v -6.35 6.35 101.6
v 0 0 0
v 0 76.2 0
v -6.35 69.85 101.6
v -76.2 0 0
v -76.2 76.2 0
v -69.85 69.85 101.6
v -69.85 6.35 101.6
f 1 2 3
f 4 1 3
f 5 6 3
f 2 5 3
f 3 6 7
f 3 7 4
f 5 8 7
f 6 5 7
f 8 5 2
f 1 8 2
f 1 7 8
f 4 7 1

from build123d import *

# Parameters (mm, degrees)
F0_W     = 76.2
F0_H     = 76.2
F1_DEPTH = 101.6
F2_SIZE2 = 101.59999
F2_SIZE  = 6.34999


# Not quite as in the source:
# - a fillet or chamfer is up to 0.001 mm smaller than in the source, because OpenCascade refuses the exact size


with BuildPart() as f1:
    # F0 (on Top) → F1 (new body)
    with BuildSketch(Plane.XY):
        with Locations((-38.1, 38.1)):
            Rectangle(F0_W, F0_H)
    extrude(amount=F1_DEPTH)

    # F2 (size 6.35 and 101.6 in the source; OpenCascade refuses exactly that, so slightly less here)
    f2_edges = [f1.edges().sort_by_distance(p)[0] for p in [
        (-38.1, 0, 101.6),
        (-76.2, 38.1, 101.6),
        (0, 38.1, 101.6),
        (-38.1, 76.2, 101.6),
    ]]
    f2_side = f1.faces().sort_by_distance((-38.1, 38.1, 101.6))[0]
    chamfer(f2_edges, length=F2_SIZE, length2=F2_SIZE2, reference=f2_side)


solid = f1.part
